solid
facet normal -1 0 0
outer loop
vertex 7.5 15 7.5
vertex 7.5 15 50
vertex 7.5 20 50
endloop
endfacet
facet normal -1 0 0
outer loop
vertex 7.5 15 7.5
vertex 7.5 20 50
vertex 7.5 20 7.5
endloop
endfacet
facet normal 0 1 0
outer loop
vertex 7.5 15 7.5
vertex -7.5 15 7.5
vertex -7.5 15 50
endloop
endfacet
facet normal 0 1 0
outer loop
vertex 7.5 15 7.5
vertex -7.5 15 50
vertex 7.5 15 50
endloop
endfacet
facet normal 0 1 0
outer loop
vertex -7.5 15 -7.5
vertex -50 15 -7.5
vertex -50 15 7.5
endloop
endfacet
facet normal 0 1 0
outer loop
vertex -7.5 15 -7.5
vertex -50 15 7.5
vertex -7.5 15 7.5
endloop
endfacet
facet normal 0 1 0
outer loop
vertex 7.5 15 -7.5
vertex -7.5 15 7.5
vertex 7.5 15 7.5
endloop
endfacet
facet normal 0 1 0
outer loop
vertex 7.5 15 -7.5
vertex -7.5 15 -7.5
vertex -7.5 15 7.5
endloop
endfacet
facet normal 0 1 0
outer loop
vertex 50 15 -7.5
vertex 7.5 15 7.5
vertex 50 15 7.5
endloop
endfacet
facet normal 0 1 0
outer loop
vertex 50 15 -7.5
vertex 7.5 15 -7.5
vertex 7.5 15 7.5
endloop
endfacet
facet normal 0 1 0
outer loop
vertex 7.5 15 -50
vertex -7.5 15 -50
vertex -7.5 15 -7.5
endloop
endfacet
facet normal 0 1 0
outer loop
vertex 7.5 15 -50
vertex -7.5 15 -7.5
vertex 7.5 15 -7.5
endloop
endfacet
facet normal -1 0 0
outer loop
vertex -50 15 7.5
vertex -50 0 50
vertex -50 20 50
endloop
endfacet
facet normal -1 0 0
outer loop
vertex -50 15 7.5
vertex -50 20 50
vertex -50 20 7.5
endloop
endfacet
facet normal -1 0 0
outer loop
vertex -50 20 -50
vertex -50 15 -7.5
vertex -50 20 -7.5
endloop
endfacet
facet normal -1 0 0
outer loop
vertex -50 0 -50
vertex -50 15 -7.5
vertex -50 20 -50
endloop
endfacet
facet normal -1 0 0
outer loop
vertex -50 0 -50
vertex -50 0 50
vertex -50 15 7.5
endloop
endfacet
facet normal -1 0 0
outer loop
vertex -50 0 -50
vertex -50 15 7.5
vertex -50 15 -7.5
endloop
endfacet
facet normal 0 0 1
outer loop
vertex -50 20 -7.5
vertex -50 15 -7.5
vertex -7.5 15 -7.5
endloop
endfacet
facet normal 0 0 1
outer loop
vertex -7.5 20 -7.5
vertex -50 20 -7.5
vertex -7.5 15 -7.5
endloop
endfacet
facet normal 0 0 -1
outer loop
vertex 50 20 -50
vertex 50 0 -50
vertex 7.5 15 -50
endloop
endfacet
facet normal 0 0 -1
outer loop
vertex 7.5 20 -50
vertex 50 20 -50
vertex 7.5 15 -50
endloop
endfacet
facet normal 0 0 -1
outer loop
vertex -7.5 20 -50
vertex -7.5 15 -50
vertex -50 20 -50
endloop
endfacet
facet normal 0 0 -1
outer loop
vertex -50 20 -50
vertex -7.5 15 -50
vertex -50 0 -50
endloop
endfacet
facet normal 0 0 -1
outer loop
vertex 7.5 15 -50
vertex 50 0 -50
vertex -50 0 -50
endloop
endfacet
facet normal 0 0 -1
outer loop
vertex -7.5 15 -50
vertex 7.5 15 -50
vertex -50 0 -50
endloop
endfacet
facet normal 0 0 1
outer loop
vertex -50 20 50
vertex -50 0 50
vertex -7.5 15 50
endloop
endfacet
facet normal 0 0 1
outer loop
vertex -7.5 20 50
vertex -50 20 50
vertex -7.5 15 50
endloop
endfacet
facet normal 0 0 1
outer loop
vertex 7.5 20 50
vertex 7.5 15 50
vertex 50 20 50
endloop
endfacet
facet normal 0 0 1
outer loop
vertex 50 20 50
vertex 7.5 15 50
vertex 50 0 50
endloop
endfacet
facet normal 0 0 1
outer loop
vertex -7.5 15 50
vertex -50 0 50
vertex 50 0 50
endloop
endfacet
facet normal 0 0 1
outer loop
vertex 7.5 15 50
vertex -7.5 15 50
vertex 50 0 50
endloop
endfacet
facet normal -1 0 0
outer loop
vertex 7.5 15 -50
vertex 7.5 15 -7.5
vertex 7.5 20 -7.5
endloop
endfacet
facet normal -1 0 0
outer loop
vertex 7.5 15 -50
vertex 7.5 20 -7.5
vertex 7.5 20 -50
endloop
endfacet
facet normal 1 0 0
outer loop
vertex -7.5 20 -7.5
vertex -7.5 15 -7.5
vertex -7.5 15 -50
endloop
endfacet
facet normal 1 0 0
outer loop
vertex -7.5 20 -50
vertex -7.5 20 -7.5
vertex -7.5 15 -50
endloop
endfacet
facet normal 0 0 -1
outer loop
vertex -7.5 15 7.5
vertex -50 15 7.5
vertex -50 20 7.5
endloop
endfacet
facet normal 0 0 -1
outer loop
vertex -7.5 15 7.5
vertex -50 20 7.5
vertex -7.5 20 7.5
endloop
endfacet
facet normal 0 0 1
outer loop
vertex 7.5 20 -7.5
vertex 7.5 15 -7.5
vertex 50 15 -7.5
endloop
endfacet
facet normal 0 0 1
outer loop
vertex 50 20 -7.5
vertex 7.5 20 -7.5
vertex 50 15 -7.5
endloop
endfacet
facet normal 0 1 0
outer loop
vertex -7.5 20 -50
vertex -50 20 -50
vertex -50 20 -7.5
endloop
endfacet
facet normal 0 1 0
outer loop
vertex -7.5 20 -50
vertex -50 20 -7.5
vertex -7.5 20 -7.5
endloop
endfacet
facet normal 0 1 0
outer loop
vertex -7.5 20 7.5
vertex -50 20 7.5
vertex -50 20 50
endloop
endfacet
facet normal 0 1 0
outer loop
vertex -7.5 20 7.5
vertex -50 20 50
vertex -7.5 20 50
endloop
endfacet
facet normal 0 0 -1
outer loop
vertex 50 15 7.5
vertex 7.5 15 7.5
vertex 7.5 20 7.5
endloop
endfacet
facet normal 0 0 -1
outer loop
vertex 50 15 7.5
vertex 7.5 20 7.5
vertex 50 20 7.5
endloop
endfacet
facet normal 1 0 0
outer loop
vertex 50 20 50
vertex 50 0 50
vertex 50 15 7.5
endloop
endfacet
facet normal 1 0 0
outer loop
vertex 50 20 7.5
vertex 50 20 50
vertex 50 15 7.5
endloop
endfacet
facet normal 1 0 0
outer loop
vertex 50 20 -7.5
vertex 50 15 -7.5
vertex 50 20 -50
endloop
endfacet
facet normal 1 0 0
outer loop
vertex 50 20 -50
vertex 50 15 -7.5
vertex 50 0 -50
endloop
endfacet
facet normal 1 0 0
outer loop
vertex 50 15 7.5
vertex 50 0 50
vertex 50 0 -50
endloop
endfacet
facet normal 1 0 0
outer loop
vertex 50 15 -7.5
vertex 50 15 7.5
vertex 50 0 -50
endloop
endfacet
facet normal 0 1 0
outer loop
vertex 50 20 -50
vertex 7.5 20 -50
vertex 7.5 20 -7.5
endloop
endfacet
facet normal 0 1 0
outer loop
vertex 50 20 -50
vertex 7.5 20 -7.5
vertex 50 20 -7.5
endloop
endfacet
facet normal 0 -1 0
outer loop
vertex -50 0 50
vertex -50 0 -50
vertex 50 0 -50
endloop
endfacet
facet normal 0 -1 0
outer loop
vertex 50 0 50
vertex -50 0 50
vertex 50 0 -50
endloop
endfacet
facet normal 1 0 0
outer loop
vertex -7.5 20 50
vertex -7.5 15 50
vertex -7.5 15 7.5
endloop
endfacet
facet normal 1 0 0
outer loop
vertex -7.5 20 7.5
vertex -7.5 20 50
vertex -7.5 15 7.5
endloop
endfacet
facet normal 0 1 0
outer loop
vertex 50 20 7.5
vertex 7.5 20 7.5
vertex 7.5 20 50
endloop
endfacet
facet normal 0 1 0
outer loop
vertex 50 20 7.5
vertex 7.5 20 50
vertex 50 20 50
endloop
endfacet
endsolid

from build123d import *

# Parameters (mm, degrees)
ESBO_O2_W                  = 42.5
ESBO_O2_H                  = 42.5
RESSALTO_EXTRUS_O1_DEPTH   = 20
RESSALTO_EXTRUS_O1_2_DEPTH = 20
RESSALTO_EXTRUS_O1_3_DEPTH = 20
RESSALTO_EXTRUS_O1_4_DEPTH = 20
RESSALTO_EXTRUS_O2_DEPTH   = 15


with BuildPart() as part:
    # Esboço2 → Ressalto-extrusão1 (new body)
    with BuildSketch(Plane(origin=(0, 0, 0), x_dir=(1, 0, 0), z_dir=(0, 1, 0))):
        with Locations((-28.75, 28.75)):
            Rectangle(ESBO_O2_W, ESBO_O2_H)
    extrude(amount=RESSALTO_EXTRUS_O1_DEPTH)



with BuildPart() as body_2:
    # Esboço2 → Ressalto-extrus_o1 2 (new body)
    with BuildSketch(Plane(origin=(0, 0, 0), x_dir=(1, 0, 0), z_dir=(0, 1, 0))):
        with Locations((28.75, 28.75)):
            Rectangle(ESBO_O2_W, ESBO_O2_H)
    extrude(amount=RESSALTO_EXTRUS_O1_2_DEPTH)


with BuildPart() as body_3:
    # Esboço2 → Ressalto-extrus_o1 3 (new body)
    with BuildSketch(Plane(origin=(0, 0, 0), x_dir=(1, 0, 0), z_dir=(0, 1, 0))):
        with Locations((-28.75, -28.75)):
            Rectangle(ESBO_O2_W, ESBO_O2_H)
    extrude(amount=RESSALTO_EXTRUS_O1_3_DEPTH)


with BuildPart() as body_4:
    # Esboço2 → Ressalto-extrus_o1 4 (new body)
    with BuildSketch(Plane(origin=(0, 0, 0), x_dir=(1, 0, 0), z_dir=(0, 1, 0))):
        with Locations((28.75, -28.75)):
            Rectangle(ESBO_O2_W, ESBO_O2_H)
    extrude(amount=RESSALTO_EXTRUS_O1_4_DEPTH)


with BuildPart() as part_1:
    add(part.part)

    add(body_2.part)  # Ressalto-extrusão2 merges body 2

    add(body_3.part)  # Ressalto-extrusão2 merges body 3

    add(body_4.part)  # Ressalto-extrusão2 merges body 4
    # Esboço2<3> → Ressalto-extrusão2 (add)
    with BuildSketch(Plane(origin=(0, 0, 0), x_dir=(1, 0, 0), z_dir=(0, 1, 0))):
        Polygon((50, 7.5), (7.5, 7.5), (7.5, 50), (-7.5, 50), (-7.5, 7.5), (-50, 7.5), (-50, -7.5), (-7.5, -7.5), (-7.5, -50), (7.5, -50), (7.5, -7.5), (50, -7.5), align=None)
    extrude(amount=RESSALTO_EXTRUS_O2_DEPTH)


solid = part_1.part
